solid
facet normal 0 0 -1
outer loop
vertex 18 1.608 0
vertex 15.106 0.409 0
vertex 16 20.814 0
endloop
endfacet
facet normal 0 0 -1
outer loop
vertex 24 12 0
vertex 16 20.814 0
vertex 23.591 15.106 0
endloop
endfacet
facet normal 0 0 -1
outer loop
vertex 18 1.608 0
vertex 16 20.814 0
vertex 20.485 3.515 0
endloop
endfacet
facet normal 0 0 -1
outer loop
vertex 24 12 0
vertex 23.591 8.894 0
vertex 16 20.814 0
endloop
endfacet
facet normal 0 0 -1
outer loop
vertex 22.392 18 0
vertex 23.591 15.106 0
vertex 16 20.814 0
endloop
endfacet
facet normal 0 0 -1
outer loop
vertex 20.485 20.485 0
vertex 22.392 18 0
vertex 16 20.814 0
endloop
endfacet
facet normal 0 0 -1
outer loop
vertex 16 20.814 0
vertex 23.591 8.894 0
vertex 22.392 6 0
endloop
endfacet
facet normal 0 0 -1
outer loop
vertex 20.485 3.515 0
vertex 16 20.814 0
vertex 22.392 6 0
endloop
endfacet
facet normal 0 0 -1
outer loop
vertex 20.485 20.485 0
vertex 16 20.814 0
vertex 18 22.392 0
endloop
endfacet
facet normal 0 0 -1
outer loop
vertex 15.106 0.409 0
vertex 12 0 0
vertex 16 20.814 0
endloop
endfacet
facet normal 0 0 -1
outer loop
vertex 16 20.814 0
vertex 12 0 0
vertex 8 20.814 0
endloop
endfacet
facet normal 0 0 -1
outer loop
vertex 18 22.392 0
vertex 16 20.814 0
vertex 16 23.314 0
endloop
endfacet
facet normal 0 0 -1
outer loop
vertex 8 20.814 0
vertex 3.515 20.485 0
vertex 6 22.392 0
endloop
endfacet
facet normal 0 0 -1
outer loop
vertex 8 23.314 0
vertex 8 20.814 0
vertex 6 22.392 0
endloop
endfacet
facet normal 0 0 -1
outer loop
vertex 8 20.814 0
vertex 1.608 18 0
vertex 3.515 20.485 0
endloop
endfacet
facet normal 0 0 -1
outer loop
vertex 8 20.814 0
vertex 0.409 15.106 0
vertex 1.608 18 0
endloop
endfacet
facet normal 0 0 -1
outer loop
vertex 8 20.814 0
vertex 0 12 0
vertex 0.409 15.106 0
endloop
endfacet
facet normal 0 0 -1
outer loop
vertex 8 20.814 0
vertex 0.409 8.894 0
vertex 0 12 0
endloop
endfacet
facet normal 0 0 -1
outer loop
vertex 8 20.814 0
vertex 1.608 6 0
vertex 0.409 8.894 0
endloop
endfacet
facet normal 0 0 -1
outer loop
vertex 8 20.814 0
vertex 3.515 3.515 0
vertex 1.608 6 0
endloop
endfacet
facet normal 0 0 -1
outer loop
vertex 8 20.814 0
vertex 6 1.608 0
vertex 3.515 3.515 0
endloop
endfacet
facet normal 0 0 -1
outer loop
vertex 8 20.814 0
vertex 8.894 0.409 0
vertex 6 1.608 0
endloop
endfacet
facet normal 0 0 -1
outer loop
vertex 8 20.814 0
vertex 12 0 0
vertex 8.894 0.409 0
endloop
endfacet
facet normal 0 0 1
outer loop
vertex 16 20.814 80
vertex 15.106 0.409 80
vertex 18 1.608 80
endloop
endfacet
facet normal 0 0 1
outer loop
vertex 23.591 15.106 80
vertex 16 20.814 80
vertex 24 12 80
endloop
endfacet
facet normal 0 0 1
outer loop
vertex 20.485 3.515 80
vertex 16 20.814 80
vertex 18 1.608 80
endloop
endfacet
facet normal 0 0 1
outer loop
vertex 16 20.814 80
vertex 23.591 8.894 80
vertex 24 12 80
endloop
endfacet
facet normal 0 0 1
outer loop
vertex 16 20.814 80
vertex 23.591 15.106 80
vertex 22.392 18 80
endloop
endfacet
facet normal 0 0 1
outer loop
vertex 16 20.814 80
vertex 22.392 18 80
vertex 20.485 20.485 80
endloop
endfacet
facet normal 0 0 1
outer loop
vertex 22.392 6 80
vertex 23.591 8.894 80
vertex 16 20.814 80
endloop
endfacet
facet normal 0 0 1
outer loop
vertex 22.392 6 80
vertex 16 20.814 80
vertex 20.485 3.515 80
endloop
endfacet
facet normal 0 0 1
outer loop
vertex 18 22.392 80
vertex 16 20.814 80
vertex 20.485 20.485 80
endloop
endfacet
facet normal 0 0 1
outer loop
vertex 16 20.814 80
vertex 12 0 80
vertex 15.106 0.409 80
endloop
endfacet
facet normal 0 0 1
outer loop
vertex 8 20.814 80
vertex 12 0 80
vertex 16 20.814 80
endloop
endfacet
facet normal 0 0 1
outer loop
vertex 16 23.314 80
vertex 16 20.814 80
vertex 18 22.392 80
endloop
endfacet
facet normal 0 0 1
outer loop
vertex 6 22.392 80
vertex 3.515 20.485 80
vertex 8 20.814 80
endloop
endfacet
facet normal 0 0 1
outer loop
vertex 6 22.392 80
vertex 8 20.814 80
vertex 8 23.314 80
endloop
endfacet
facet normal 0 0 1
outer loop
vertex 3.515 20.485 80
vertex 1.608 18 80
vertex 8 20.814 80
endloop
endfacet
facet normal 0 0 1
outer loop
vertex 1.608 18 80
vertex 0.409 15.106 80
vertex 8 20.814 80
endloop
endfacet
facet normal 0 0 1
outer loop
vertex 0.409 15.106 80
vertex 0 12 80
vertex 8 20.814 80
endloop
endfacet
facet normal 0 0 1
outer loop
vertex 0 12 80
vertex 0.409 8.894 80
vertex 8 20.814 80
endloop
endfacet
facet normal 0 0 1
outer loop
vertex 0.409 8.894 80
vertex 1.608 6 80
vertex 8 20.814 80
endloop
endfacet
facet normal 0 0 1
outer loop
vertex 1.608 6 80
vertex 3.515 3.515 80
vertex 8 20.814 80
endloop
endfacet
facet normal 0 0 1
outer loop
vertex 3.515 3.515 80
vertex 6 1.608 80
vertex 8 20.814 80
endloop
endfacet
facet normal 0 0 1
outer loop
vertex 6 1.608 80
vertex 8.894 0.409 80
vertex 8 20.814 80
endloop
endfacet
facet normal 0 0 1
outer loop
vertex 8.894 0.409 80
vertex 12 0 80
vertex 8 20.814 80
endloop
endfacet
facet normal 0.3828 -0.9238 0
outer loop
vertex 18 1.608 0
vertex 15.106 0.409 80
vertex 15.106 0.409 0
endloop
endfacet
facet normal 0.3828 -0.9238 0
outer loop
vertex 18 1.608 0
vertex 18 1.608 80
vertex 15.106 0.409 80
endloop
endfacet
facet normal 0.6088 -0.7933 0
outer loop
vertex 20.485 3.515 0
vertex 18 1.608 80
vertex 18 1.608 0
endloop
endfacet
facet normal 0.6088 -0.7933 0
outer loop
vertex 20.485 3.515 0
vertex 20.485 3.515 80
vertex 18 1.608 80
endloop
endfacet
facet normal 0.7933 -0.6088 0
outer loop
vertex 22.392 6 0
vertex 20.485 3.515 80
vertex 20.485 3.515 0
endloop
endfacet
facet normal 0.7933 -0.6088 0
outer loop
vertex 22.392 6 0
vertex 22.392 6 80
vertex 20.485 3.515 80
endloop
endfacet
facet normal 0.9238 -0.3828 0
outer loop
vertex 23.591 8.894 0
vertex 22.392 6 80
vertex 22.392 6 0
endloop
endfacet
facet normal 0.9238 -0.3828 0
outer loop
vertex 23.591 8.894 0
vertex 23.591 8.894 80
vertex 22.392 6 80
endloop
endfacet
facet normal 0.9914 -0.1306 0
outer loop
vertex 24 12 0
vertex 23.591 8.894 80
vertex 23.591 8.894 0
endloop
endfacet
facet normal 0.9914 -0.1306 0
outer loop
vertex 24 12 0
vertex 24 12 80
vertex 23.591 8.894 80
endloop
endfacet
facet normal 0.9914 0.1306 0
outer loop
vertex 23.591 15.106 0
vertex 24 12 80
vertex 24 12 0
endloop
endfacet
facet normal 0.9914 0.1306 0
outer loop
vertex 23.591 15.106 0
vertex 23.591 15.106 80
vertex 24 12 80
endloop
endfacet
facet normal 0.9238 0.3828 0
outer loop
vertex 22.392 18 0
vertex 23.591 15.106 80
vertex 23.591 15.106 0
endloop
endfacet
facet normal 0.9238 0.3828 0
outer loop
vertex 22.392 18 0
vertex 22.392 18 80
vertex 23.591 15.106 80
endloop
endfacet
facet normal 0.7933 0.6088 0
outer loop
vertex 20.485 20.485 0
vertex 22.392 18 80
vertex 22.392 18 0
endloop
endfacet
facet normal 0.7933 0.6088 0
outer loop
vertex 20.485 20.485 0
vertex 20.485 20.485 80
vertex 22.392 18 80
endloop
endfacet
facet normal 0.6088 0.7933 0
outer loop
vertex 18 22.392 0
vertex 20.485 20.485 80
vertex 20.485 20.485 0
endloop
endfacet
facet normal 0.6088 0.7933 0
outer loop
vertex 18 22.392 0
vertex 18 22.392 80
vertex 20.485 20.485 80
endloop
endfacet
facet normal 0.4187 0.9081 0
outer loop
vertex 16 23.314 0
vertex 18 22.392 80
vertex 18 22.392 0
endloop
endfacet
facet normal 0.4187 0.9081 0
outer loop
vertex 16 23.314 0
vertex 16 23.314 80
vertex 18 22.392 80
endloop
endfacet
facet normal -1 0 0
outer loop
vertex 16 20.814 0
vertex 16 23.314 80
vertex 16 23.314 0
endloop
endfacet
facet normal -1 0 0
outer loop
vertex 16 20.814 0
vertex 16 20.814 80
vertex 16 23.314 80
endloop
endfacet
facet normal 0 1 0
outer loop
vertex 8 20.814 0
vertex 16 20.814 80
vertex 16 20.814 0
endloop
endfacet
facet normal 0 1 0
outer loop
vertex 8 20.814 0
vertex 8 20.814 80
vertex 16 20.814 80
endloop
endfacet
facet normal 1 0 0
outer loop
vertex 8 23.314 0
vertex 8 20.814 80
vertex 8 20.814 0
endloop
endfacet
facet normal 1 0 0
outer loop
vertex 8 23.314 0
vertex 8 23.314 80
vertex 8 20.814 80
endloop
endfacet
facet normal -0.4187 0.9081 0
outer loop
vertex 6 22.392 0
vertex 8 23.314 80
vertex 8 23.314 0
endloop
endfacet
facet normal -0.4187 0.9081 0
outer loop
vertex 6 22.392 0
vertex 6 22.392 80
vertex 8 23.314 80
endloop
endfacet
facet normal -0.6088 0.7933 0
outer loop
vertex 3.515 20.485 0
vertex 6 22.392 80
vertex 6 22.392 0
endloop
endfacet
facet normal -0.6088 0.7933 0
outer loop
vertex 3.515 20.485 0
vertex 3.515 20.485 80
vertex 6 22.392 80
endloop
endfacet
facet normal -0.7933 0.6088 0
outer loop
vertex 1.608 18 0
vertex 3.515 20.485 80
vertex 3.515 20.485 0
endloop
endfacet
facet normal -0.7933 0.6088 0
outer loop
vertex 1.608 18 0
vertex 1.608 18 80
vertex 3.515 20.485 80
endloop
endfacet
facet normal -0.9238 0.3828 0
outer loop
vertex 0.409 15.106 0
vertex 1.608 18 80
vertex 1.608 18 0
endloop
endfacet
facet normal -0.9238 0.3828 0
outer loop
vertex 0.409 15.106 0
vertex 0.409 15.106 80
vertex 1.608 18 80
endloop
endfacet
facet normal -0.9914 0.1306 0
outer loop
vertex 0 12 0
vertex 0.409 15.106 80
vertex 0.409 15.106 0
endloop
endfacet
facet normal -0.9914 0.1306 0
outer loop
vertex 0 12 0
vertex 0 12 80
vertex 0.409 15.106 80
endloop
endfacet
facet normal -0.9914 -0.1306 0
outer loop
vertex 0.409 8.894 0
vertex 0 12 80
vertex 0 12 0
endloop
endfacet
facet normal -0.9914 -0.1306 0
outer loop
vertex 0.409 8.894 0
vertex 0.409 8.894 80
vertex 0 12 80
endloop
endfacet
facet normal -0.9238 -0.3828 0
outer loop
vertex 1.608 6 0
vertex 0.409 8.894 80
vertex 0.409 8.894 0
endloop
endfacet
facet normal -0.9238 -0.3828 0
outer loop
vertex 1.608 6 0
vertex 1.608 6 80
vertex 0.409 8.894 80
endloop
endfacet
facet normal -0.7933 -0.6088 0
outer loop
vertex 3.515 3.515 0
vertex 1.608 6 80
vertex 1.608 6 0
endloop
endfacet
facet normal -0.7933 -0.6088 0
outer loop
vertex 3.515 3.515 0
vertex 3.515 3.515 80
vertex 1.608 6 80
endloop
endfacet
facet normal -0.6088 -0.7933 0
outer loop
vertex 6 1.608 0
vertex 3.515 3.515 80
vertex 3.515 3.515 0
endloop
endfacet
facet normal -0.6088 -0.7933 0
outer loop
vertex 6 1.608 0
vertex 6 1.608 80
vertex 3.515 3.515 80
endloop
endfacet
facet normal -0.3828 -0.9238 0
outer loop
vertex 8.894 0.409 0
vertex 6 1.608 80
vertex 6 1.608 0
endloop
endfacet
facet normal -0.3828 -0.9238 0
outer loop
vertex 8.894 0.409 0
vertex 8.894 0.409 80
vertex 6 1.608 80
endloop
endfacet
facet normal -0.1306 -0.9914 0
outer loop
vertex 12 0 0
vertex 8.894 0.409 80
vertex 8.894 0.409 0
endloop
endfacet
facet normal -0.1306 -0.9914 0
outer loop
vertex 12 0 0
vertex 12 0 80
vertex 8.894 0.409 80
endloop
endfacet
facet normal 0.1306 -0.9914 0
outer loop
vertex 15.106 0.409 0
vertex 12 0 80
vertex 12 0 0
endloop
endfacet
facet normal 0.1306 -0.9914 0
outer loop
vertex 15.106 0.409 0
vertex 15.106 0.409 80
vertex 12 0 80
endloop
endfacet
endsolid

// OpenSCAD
$fn = 32;

// ----------------------------------------------------------------------
// Keyway shaft: d24 shaft, key 8 x 2.5 mm
// ----------------------------------------------------------------------

// --- parameters (mm) ---
shaft_r = 12;             // shaft radius
key_w = 8;                // keyway width
key_d = 2.5;              // keyway depth below the surface line
plate_t = 80;             // shaft length, Z (extrusion height)

shaft_d = 2 * shaft_r;  // shaft diameter
circle_step = 15;  // polygon sampling step, degrees

profile = [[6, 22.392], [3.515, 20.485], [1.608, 18], [0.409, 15.106], [0, 12], [0.409, 8.894], [1.608, 6], [3.515, 3.515], [6, 1.608], [8.894, 0.409], [12, 0], [15.106, 0.409], [18, 1.608], [20.485, 3.515], [22.392, 6], [23.591, 8.894], [24, 12], [23.591, 15.106], [22.392, 18], [20.485, 20.485], [18, 22.392], [16, 23.314], [16, 20.814], [8, 20.814], [8, 23.314]];  // primary outline, 25 points, counter clockwise

// --- the one profile operation ---
linear_extrude(height = plate_t) polygon(points = profile);
